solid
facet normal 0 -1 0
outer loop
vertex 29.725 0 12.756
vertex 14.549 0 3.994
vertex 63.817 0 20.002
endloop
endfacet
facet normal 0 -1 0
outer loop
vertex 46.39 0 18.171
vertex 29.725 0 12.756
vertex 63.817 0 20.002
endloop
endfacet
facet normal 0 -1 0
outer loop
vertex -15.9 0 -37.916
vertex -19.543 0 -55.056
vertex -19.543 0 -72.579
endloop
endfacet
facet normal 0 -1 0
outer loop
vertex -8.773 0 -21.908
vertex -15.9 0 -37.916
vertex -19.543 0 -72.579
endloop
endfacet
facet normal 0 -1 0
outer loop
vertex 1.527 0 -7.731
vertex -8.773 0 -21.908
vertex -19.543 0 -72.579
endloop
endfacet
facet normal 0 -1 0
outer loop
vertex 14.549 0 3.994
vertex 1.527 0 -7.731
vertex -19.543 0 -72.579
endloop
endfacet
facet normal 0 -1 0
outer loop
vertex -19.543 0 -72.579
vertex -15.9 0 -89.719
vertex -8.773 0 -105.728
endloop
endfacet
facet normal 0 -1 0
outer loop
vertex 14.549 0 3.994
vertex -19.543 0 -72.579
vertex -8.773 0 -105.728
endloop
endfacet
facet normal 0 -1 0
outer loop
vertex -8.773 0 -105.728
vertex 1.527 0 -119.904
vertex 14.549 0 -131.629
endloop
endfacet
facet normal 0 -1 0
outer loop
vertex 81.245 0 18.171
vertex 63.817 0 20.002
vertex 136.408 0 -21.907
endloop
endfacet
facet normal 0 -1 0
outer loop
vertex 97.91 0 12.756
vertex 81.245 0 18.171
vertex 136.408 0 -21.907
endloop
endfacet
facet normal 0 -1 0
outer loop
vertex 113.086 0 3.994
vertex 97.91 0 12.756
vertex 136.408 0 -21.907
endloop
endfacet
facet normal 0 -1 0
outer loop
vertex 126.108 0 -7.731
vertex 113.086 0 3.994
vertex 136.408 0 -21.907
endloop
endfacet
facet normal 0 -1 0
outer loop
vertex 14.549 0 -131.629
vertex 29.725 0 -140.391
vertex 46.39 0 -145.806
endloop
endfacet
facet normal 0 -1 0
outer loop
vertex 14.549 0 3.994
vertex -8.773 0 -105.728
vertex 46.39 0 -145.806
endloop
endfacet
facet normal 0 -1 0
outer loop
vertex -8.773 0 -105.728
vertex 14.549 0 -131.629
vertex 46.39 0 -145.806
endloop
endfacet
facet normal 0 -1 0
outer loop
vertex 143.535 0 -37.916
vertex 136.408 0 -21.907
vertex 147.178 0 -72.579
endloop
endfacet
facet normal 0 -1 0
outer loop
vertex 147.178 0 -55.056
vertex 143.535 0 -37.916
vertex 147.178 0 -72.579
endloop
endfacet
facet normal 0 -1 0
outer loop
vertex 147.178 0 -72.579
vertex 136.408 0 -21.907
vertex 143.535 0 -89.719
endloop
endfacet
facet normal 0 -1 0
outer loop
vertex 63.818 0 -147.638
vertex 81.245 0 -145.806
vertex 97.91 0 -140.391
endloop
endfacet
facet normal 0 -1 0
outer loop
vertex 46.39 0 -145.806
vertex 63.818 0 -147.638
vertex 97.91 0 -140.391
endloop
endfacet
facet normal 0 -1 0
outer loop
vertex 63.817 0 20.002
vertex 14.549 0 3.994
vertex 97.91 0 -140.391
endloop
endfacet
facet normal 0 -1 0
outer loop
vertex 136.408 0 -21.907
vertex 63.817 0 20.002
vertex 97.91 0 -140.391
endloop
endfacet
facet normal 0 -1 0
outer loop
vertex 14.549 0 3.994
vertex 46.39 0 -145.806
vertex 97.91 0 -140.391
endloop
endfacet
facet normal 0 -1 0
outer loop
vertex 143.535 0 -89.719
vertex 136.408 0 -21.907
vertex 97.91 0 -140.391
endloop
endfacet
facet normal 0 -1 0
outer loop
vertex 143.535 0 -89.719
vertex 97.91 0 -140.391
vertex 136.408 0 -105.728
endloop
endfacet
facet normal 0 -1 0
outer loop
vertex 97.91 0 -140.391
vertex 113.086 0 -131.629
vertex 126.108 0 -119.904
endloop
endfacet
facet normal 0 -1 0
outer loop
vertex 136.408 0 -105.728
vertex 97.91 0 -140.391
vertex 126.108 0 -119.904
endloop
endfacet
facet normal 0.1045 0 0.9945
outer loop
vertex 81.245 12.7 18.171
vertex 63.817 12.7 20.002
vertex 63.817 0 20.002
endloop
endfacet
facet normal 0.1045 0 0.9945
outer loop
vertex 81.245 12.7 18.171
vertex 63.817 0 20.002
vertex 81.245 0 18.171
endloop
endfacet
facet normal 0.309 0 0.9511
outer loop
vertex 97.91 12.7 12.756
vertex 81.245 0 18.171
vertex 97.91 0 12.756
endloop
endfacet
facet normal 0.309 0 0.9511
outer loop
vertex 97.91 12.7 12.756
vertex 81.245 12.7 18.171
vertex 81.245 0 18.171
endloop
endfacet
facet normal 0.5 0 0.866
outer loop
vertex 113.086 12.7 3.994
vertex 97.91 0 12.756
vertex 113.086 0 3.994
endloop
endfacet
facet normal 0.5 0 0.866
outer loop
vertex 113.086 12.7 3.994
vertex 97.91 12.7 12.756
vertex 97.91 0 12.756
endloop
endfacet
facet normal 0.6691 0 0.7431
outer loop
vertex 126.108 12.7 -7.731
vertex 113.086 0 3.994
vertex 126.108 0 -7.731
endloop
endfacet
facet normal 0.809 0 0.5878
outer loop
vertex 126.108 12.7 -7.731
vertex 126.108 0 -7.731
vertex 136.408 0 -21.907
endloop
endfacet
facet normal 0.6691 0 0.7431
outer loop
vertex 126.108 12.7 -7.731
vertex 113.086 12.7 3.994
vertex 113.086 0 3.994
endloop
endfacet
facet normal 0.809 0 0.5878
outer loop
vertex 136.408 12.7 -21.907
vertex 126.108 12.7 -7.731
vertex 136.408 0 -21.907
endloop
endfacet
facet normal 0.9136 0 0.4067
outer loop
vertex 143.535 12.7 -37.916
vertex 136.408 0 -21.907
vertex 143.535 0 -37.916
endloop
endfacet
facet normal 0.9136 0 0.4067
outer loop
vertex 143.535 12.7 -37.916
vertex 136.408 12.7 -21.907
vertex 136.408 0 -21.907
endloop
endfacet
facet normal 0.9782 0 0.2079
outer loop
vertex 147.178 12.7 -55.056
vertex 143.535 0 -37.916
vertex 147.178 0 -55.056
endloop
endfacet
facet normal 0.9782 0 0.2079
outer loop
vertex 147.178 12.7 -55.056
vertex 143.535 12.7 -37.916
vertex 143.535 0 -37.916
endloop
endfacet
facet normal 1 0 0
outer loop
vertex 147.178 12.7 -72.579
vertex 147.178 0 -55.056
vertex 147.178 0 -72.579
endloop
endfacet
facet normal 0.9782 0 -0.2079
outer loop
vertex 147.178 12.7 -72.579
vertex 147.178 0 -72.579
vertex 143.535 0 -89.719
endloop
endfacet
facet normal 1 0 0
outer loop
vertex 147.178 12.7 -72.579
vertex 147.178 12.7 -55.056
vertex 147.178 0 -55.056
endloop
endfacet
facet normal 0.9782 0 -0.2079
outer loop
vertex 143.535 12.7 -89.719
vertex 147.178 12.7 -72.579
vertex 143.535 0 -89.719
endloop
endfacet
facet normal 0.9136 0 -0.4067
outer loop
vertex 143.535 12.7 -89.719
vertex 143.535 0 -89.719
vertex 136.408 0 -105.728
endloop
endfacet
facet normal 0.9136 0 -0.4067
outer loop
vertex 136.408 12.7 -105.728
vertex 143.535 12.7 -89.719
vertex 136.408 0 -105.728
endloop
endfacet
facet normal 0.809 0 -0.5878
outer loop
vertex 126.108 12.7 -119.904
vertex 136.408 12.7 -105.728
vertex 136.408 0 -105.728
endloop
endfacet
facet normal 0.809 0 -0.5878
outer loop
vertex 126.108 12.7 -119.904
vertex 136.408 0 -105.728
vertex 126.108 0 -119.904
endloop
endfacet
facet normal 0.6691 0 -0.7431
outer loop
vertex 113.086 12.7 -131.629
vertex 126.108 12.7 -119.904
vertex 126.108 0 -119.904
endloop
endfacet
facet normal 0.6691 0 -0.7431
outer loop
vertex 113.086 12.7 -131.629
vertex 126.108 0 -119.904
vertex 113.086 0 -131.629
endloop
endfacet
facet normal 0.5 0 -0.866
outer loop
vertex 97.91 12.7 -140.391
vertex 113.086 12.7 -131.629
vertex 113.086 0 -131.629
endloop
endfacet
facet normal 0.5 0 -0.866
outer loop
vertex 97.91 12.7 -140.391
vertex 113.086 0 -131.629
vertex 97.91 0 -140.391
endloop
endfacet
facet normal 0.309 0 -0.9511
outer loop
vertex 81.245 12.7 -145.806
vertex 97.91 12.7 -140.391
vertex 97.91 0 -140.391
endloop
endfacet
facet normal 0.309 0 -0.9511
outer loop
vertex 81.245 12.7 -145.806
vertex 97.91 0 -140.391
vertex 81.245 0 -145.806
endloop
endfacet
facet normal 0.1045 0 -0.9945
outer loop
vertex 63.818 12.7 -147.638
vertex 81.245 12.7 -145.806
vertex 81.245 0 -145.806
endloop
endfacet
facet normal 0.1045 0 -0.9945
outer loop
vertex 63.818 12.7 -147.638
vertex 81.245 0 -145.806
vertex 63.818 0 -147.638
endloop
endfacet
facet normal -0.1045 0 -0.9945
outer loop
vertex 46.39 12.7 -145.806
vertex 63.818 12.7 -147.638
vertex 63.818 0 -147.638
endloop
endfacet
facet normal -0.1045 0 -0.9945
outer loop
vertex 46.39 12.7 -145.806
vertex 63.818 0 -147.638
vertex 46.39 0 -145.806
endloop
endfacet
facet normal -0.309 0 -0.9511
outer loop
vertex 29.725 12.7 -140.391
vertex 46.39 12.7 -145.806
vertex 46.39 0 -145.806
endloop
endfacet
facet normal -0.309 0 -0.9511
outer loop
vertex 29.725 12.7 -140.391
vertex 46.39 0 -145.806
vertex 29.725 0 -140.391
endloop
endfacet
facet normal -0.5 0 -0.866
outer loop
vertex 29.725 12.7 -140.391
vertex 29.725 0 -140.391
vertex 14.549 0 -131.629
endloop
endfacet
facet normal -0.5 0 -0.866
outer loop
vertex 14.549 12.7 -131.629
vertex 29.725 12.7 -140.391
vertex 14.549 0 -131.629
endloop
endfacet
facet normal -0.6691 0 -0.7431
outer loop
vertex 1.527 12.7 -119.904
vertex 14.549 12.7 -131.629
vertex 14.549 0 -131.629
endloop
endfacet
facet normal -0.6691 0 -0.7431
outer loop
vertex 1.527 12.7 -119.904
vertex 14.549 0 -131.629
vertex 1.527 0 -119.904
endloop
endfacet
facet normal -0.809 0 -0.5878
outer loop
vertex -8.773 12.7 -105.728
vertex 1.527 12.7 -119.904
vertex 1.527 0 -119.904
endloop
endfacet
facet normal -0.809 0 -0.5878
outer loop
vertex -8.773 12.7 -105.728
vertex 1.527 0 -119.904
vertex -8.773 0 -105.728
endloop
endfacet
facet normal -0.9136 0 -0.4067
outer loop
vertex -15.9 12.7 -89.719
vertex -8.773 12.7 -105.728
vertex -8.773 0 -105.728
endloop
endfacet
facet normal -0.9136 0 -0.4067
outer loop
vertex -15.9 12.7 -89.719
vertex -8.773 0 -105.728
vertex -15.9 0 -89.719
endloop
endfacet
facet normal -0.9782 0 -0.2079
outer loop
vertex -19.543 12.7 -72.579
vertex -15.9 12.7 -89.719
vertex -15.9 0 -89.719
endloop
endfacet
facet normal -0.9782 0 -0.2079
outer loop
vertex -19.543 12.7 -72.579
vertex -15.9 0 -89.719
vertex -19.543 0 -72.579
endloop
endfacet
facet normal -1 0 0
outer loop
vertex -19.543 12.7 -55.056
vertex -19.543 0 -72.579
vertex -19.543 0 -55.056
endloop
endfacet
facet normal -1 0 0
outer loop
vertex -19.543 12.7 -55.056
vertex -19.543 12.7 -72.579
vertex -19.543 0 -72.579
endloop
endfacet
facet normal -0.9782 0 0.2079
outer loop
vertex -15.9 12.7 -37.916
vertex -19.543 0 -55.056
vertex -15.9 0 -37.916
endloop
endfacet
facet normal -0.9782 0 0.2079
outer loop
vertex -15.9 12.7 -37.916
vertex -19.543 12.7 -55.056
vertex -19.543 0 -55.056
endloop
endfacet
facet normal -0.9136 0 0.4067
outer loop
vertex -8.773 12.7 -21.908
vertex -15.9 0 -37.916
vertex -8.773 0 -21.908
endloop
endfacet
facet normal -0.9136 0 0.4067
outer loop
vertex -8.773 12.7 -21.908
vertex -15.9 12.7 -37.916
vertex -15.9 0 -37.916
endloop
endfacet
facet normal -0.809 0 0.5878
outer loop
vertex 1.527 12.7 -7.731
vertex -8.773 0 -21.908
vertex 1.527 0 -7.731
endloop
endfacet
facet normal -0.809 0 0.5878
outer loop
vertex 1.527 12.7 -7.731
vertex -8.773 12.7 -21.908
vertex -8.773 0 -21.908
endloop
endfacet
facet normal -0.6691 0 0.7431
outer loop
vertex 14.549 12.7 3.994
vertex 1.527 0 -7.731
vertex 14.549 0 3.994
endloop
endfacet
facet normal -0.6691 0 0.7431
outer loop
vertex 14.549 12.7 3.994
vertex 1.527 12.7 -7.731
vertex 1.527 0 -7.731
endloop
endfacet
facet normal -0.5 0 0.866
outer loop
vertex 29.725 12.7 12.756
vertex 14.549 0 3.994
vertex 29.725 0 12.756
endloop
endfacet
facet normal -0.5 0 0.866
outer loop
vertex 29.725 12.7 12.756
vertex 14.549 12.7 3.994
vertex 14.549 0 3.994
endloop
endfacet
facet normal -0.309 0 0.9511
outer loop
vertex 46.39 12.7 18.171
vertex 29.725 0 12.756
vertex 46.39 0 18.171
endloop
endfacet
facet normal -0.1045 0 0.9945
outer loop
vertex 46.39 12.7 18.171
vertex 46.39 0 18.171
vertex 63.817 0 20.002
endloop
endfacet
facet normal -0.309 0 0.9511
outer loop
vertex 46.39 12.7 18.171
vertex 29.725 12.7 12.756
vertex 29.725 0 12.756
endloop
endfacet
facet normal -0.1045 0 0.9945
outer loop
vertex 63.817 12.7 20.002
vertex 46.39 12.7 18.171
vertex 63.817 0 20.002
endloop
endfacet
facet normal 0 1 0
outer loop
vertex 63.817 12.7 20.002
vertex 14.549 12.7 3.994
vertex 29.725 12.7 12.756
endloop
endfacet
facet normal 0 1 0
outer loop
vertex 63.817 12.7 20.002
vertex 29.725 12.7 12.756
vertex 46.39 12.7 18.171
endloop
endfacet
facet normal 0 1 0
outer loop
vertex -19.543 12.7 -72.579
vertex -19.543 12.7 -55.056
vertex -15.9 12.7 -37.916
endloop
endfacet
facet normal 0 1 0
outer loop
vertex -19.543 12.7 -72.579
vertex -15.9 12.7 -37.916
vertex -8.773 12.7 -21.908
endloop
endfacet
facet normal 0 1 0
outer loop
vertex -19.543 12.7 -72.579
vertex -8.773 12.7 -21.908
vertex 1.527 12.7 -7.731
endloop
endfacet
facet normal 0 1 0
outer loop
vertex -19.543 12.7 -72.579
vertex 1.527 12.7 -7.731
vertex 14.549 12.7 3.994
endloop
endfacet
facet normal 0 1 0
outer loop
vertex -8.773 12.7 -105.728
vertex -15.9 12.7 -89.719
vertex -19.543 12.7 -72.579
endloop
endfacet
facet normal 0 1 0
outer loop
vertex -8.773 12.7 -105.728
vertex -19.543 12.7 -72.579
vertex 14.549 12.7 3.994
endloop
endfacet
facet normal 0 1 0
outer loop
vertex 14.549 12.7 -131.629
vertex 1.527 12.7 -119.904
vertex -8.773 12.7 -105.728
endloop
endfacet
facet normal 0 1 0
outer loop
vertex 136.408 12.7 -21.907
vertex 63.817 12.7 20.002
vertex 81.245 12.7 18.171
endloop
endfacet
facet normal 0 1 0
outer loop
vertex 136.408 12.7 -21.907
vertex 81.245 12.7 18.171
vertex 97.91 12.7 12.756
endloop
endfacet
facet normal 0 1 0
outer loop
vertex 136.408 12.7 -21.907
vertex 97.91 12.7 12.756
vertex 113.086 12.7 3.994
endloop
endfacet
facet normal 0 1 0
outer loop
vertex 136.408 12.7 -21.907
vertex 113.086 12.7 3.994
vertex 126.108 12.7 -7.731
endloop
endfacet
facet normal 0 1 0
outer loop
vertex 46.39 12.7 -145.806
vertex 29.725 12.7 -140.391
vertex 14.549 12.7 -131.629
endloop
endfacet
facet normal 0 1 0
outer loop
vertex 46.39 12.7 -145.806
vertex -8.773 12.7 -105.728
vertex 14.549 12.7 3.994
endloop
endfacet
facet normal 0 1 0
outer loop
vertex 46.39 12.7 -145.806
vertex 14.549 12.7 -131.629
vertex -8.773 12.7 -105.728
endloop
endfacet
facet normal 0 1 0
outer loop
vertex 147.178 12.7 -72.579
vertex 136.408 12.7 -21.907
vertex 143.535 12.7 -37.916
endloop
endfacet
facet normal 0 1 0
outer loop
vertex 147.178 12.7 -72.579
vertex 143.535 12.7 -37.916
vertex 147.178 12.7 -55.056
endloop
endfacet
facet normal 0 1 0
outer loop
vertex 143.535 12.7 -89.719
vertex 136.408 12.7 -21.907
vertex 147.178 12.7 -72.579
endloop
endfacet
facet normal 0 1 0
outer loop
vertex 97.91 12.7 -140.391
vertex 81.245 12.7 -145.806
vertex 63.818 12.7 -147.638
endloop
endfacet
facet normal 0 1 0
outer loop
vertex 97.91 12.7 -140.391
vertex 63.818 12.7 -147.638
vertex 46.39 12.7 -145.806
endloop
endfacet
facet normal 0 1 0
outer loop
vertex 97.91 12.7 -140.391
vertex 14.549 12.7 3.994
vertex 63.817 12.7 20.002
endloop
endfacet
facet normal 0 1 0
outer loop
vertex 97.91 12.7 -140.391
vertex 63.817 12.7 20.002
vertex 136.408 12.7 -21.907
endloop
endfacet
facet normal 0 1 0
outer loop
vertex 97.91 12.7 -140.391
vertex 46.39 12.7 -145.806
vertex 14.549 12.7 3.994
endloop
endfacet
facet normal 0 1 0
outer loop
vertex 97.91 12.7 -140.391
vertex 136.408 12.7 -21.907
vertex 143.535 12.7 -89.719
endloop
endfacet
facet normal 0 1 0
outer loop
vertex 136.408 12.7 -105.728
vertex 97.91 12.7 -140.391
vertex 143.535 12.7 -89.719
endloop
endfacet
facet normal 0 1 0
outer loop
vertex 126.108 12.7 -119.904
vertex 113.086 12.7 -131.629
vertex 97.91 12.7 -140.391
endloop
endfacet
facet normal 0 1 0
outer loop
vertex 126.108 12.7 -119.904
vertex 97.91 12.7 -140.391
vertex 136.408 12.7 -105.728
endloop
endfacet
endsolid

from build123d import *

# Parameters (mm, degrees)
SKETCH1_W           = 127.635
SKETCH1_H           = 127.635
MAIN_PLATE_DEPTH    = 12.7
SKETCH9_R           = 85.725
BOSS_EXTRUDE1_DEPTH = 12.7
SKETCH10_R          = 97.039626961
SKETCH10_R_2        = 83.82
CUT_EXTRUDE1_DEPTH  = 167.64


with BuildPart() as part:
    # Sketch1 → Main Plate (new body)
    with BuildSketch(Plane(origin=(0, 0, 0), x_dir=(1, 0, 0), z_dir=(0, 1, 0))):
        with Locations((63.8175, 63.8175)):
            Rectangle(SKETCH1_W, SKETCH1_H)
    extrude(amount=MAIN_PLATE_DEPTH)

    # Sketch9 → Boss-Extrude1 (add)
    with BuildSketch(Plane(origin=(0, 12.7, 0), x_dir=(1, 0, 0), z_dir=(0, 1, 0))):
        with Locations((63.8175, 63.8175)):
            Circle(SKETCH9_R)
    extrude(amount=-BOSS_EXTRUDE1_DEPTH)

    # Sketch10 → Cut-Extrude1 (cut)
    with BuildSketch(Plane(origin=(0, 12.7, 0), x_dir=(1, 0, 0), z_dir=(0, 1, 0))):
        with Locations((63.8175, 63.8175)):
            Circle(SKETCH10_R)
        with Locations(Location((63.8175, 63.8175, 0), (0, 0, 270))):
            Circle(SKETCH10_R_2, mode=Mode.SUBTRACT)
    extrude(amount=-CUT_EXTRUDE1_DEPTH, mode=Mode.SUBTRACT)


solid = part.part
